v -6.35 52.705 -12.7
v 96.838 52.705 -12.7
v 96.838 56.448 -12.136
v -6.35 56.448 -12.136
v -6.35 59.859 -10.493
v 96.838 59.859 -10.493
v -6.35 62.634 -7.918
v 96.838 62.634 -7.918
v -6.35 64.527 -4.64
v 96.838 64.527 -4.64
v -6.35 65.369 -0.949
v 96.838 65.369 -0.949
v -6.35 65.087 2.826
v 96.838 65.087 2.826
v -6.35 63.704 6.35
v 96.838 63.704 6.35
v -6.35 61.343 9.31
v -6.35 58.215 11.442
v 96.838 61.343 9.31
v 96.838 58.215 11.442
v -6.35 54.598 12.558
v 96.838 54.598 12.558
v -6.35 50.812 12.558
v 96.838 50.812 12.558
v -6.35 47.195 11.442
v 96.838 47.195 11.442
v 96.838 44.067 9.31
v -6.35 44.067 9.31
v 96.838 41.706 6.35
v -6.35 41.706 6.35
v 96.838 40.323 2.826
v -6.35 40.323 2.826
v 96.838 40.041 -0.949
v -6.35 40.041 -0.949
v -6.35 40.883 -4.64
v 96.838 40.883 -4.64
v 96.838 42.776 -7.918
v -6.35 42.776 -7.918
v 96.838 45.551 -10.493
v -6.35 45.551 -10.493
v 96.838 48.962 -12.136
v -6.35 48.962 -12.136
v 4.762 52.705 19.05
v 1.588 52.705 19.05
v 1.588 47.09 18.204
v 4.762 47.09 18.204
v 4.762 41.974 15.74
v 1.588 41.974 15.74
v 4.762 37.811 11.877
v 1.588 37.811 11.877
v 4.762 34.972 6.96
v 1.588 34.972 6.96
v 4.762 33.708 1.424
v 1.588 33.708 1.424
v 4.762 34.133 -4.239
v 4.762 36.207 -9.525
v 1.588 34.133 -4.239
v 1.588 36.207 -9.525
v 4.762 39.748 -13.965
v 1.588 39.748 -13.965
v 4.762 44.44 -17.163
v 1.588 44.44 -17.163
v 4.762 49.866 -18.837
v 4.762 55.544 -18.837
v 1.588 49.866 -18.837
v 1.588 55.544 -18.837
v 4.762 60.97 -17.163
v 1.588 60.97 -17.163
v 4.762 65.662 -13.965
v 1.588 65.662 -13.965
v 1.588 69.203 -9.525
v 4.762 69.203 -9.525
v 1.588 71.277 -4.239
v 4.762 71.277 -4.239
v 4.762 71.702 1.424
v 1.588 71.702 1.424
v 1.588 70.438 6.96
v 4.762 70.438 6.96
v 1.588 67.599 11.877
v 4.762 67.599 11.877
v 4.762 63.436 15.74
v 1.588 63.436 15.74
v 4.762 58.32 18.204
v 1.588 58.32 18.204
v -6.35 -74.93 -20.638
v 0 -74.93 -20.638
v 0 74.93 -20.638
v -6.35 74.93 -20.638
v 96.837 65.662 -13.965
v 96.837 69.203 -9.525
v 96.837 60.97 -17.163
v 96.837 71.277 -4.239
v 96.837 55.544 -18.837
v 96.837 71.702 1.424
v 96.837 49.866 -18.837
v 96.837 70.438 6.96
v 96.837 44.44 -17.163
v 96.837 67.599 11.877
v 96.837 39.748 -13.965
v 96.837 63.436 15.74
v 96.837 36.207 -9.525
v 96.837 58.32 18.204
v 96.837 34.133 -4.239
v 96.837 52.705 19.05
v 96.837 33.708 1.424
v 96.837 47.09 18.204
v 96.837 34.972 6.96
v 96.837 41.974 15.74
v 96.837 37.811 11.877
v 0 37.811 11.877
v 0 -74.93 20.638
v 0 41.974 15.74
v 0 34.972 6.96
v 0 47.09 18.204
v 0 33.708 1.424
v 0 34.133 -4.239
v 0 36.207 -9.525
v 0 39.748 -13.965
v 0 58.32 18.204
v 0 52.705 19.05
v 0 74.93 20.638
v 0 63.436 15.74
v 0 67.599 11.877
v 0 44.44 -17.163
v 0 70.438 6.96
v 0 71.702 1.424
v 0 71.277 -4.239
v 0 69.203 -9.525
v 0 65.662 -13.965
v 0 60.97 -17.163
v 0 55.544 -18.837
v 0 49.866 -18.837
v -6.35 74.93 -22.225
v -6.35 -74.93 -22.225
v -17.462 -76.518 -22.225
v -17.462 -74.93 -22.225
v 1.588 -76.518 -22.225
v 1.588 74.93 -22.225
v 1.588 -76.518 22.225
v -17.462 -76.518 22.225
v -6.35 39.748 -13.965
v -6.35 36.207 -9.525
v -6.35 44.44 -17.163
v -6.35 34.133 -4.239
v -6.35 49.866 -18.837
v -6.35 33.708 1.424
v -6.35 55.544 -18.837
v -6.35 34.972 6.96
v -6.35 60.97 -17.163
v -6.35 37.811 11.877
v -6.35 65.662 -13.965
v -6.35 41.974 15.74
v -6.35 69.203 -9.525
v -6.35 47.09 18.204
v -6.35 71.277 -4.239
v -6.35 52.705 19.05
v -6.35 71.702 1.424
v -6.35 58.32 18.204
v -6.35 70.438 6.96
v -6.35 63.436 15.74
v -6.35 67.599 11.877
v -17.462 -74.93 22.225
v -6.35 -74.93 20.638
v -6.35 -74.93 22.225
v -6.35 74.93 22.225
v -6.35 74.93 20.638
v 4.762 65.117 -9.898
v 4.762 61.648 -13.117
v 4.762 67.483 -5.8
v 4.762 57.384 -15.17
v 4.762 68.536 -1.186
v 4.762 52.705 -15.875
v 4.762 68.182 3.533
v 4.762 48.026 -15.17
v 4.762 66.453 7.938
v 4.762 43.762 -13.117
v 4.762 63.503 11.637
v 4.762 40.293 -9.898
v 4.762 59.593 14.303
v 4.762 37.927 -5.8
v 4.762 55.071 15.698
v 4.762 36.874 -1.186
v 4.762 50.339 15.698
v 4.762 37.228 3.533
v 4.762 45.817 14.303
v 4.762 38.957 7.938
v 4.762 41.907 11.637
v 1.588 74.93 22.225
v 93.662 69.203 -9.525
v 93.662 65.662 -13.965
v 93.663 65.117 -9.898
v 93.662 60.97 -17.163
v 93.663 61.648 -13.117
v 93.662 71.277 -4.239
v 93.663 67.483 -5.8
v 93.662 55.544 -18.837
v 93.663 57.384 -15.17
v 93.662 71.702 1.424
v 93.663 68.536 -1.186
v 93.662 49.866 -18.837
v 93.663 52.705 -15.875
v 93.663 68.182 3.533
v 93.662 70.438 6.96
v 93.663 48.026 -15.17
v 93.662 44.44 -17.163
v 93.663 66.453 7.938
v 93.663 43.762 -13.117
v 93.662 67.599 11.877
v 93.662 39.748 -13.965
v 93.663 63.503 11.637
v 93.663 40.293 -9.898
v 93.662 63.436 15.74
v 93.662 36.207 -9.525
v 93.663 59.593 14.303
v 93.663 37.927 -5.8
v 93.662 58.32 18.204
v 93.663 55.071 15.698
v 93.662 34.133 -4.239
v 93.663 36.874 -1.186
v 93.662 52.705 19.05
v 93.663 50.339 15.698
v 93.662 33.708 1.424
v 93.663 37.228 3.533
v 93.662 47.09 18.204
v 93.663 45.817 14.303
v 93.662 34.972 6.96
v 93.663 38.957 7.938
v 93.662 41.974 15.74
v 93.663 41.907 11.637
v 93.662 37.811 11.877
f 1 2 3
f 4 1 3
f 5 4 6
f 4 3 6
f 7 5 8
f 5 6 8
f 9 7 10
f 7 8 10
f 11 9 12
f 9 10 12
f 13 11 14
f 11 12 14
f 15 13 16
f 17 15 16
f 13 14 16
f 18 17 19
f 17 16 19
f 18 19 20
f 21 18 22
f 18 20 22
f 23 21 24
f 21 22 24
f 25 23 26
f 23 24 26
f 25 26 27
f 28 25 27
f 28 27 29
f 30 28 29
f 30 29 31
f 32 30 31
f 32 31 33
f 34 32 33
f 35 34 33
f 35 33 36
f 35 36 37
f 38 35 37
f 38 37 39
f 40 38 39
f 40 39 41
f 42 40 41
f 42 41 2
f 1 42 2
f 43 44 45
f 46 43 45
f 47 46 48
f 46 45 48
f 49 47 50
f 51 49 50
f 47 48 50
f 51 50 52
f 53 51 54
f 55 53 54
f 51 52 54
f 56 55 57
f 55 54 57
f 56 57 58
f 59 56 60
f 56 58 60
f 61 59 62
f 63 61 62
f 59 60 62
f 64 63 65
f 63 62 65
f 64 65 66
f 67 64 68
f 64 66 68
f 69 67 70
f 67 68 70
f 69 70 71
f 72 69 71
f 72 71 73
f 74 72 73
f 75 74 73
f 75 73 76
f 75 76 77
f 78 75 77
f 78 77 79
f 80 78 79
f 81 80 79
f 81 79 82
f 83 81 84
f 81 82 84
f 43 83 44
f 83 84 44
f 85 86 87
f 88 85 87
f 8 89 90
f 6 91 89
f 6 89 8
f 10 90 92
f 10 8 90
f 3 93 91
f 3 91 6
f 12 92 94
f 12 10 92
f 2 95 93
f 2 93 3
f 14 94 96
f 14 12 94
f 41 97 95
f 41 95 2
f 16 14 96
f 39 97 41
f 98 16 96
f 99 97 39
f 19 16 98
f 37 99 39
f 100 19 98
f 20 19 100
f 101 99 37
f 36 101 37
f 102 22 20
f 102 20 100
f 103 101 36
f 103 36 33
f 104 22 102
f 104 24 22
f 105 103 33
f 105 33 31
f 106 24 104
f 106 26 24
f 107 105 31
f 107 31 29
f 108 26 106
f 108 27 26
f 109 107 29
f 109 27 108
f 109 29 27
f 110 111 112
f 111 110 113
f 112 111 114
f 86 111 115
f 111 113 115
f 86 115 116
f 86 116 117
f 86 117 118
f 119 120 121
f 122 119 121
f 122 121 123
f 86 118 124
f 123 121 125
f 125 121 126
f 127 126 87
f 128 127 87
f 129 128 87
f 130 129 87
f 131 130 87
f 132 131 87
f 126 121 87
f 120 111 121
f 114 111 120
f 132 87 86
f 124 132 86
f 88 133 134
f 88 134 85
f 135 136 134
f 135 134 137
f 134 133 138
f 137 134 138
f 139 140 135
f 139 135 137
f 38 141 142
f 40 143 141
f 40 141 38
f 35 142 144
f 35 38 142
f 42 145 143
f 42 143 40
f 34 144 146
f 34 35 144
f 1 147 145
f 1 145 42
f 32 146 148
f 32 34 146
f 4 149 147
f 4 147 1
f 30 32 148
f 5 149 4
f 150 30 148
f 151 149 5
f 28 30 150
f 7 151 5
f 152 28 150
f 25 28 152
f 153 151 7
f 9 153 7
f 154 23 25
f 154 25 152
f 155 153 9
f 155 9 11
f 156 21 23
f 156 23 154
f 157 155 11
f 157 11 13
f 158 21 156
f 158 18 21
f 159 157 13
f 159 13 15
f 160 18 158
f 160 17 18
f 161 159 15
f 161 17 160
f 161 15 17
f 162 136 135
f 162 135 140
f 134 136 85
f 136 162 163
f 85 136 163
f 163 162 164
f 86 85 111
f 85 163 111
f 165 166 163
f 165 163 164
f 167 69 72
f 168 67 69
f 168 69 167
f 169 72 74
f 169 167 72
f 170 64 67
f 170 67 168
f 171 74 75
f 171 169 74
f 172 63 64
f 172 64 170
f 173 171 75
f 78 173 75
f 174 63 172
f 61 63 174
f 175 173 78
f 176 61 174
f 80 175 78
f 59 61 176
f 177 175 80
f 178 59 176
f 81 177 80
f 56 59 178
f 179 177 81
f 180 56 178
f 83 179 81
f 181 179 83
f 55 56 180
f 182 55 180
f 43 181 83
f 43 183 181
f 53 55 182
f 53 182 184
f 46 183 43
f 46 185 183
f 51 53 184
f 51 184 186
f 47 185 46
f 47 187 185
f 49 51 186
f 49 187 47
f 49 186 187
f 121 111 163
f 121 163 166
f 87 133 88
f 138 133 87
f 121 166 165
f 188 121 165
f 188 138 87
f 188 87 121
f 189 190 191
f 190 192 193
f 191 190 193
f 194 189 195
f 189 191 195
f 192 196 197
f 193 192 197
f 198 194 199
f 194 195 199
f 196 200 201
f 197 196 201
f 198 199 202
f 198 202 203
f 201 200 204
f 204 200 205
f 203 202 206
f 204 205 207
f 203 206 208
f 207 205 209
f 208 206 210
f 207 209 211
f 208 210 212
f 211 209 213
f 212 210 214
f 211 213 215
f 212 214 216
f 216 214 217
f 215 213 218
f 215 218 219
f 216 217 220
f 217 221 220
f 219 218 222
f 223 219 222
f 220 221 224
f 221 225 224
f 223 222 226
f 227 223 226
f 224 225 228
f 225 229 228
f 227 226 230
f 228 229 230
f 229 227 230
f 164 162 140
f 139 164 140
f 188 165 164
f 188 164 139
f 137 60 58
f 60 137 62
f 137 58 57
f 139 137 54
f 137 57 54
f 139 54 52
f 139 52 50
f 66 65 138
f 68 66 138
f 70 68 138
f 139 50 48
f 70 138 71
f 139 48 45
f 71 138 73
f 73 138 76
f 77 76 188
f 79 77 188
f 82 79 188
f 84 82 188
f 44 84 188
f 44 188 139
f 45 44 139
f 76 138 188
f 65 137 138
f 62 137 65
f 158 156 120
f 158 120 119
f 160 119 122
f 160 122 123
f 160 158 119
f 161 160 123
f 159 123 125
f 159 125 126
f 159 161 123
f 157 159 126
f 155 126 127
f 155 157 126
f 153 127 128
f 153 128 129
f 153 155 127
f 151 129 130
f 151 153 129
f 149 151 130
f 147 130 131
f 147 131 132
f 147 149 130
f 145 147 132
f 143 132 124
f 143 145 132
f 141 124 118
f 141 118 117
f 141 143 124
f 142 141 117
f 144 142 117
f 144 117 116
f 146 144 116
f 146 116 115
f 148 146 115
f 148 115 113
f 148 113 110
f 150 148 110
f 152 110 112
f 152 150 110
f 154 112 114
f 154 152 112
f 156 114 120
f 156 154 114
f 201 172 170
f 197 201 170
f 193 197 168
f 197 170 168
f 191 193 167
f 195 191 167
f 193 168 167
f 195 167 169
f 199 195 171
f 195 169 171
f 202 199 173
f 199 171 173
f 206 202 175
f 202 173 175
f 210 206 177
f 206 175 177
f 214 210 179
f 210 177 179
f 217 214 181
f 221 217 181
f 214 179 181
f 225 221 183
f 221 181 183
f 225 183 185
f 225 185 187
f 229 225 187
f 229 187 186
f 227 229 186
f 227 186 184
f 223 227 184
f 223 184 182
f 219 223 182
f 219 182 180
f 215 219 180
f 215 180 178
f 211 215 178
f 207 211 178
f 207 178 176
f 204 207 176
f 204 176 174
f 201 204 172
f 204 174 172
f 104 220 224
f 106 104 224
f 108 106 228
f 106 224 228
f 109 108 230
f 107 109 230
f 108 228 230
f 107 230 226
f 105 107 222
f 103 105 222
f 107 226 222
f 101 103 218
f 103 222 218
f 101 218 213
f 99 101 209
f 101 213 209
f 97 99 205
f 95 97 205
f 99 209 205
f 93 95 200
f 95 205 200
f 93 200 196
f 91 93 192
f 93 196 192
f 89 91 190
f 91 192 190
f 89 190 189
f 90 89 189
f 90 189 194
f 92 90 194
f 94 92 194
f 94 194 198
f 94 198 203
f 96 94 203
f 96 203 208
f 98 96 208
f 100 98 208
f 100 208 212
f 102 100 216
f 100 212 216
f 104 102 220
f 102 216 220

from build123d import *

# Parameters (mm, degrees)
SKETCH1_W           = 44.45
SKETCH1_H           = 149.86
BOSS_EXTRUDE1_DEPTH = 1.5875
SKETCH2_W           = 1.5875
SKETCH2_H           = 149.86
BOSS_EXTRUDE2_DEPTH = 6.35
SKETCH3_W           = 19.05
SKETCH3_H           = 44.45
BOSS_EXTRUDE3_DEPTH = 1.5875
SKETCH4_R           = 19.05
BOSS_EXTRUDE4_DEPTH = 3.175
SKETCH5_R           = 15.875
BOSS_EXTRUDE5_DEPTH = 88.9
SKETCH6_R           = 19.05
BOSS_EXTRUDE6_DEPTH = 3.175
BOSS_EXTRUDE7_START = 6.35
SKETCH7_R           = 19.05
BOSS_EXTRUDE7_DEPTH = 6.35
SKETCH8_R           = 12.7
CUT_EXTRUDE1_DEPTH  = 113.665


with BuildPart() as part:
    # Sketch1 → Boss-Extrude1 (new body)
    with BuildSketch(Plane(origin=(0, 0, 0), x_dir=(0, 0, -1), z_dir=(1, 0, 0))):
        Rectangle(SKETCH1_W, SKETCH1_H)
    extrude(amount=BOSS_EXTRUDE1_DEPTH)

    # Sketch2 → Boss-Extrude2 (add)
    with BuildSketch(Plane.ZY):
        with Locations((21.43125, 0)):
            Rectangle(SKETCH2_W, SKETCH2_H)
        with Locations((-21.43125, 0)):
            Rectangle(SKETCH2_W, SKETCH2_H)
    extrude(amount=BOSS_EXTRUDE2_DEPTH)

    # Sketch3 → Boss-Extrude3 (add)
    with BuildSketch(Plane.XZ.offset(74.93)):
        with Locations((-7.9375, 0)):
            Rectangle(SKETCH3_W, SKETCH3_H)
    extrude(amount=BOSS_EXTRUDE3_DEPTH)

    # Sketch4 → Boss-Extrude4 (add)
    with BuildSketch(Plane(origin=(1.5875, 0, 0), x_dir=(0, 0, -1), z_dir=(1, 0, 0))):
        with Locations(Location((0, 52.705, 0), (0, 0, 180))):
            Circle(SKETCH4_R)
    extrude(amount=BOSS_EXTRUDE4_DEPTH)

    # Sketch5 → Boss-Extrude5 (add)
    with BuildSketch(Plane(origin=(4.7625, 0, 0), x_dir=(0, 0, -1), z_dir=(1, 0, 0))):
        with Locations((0, 52.705)):
            Circle(SKETCH5_R)
    extrude(amount=BOSS_EXTRUDE5_DEPTH)

    # Sketch6 → Boss-Extrude6 (add)
    with BuildSketch(Plane(origin=(93.6625, 0, 0), x_dir=(0, 0, -1), z_dir=(1, 0, 0))):
        with Locations(Location((0, 52.705, 0), (0, 0, 180))):
            Circle(SKETCH6_R)
    extrude(amount=BOSS_EXTRUDE6_DEPTH)

    # Sketch7 → Boss-Extrude7 (add)
    with BuildSketch(Plane.ZY.offset(BOSS_EXTRUDE7_START)):
        with Locations((0, 52.705)):
            Circle(SKETCH7_R)
    extrude(amount=-BOSS_EXTRUDE7_DEPTH)

    # Sketch8 → Cut-Extrude1 (cut)
    with BuildSketch(Plane(origin=(96.8375, 0, 0), x_dir=(0, 0, -1), z_dir=(1, 0, 0))):
        with Locations((0, 52.705)):
            Circle(SKETCH8_R)
    extrude(amount=-CUT_EXTRUDE1_DEPTH, mode=Mode.SUBTRACT)


solid = part.part
